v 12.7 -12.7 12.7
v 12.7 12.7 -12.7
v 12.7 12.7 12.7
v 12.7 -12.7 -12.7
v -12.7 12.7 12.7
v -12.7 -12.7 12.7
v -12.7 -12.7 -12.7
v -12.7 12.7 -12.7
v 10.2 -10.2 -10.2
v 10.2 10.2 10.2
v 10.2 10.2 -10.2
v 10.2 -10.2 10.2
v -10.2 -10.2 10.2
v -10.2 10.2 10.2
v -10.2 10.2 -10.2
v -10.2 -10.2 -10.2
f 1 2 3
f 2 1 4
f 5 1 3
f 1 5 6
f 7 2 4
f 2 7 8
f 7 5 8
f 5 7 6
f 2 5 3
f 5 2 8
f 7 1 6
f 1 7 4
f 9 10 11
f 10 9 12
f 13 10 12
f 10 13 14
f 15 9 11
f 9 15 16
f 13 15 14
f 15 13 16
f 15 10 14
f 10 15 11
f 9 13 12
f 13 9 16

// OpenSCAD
inch = 25.4;

// Cube w/in a Cube
difference() {
    color("blue", 0.10) cube([inch,inch,inch], center=true);
    color("red",.10) cube([inch-5,inch-5,inch-5], center=true);
}

// translate([-13,5,12.5]) {
//     color("green") linear_extrude(height=1) {
//         text("Craig", size=8, valign="top");
//     }
// }
